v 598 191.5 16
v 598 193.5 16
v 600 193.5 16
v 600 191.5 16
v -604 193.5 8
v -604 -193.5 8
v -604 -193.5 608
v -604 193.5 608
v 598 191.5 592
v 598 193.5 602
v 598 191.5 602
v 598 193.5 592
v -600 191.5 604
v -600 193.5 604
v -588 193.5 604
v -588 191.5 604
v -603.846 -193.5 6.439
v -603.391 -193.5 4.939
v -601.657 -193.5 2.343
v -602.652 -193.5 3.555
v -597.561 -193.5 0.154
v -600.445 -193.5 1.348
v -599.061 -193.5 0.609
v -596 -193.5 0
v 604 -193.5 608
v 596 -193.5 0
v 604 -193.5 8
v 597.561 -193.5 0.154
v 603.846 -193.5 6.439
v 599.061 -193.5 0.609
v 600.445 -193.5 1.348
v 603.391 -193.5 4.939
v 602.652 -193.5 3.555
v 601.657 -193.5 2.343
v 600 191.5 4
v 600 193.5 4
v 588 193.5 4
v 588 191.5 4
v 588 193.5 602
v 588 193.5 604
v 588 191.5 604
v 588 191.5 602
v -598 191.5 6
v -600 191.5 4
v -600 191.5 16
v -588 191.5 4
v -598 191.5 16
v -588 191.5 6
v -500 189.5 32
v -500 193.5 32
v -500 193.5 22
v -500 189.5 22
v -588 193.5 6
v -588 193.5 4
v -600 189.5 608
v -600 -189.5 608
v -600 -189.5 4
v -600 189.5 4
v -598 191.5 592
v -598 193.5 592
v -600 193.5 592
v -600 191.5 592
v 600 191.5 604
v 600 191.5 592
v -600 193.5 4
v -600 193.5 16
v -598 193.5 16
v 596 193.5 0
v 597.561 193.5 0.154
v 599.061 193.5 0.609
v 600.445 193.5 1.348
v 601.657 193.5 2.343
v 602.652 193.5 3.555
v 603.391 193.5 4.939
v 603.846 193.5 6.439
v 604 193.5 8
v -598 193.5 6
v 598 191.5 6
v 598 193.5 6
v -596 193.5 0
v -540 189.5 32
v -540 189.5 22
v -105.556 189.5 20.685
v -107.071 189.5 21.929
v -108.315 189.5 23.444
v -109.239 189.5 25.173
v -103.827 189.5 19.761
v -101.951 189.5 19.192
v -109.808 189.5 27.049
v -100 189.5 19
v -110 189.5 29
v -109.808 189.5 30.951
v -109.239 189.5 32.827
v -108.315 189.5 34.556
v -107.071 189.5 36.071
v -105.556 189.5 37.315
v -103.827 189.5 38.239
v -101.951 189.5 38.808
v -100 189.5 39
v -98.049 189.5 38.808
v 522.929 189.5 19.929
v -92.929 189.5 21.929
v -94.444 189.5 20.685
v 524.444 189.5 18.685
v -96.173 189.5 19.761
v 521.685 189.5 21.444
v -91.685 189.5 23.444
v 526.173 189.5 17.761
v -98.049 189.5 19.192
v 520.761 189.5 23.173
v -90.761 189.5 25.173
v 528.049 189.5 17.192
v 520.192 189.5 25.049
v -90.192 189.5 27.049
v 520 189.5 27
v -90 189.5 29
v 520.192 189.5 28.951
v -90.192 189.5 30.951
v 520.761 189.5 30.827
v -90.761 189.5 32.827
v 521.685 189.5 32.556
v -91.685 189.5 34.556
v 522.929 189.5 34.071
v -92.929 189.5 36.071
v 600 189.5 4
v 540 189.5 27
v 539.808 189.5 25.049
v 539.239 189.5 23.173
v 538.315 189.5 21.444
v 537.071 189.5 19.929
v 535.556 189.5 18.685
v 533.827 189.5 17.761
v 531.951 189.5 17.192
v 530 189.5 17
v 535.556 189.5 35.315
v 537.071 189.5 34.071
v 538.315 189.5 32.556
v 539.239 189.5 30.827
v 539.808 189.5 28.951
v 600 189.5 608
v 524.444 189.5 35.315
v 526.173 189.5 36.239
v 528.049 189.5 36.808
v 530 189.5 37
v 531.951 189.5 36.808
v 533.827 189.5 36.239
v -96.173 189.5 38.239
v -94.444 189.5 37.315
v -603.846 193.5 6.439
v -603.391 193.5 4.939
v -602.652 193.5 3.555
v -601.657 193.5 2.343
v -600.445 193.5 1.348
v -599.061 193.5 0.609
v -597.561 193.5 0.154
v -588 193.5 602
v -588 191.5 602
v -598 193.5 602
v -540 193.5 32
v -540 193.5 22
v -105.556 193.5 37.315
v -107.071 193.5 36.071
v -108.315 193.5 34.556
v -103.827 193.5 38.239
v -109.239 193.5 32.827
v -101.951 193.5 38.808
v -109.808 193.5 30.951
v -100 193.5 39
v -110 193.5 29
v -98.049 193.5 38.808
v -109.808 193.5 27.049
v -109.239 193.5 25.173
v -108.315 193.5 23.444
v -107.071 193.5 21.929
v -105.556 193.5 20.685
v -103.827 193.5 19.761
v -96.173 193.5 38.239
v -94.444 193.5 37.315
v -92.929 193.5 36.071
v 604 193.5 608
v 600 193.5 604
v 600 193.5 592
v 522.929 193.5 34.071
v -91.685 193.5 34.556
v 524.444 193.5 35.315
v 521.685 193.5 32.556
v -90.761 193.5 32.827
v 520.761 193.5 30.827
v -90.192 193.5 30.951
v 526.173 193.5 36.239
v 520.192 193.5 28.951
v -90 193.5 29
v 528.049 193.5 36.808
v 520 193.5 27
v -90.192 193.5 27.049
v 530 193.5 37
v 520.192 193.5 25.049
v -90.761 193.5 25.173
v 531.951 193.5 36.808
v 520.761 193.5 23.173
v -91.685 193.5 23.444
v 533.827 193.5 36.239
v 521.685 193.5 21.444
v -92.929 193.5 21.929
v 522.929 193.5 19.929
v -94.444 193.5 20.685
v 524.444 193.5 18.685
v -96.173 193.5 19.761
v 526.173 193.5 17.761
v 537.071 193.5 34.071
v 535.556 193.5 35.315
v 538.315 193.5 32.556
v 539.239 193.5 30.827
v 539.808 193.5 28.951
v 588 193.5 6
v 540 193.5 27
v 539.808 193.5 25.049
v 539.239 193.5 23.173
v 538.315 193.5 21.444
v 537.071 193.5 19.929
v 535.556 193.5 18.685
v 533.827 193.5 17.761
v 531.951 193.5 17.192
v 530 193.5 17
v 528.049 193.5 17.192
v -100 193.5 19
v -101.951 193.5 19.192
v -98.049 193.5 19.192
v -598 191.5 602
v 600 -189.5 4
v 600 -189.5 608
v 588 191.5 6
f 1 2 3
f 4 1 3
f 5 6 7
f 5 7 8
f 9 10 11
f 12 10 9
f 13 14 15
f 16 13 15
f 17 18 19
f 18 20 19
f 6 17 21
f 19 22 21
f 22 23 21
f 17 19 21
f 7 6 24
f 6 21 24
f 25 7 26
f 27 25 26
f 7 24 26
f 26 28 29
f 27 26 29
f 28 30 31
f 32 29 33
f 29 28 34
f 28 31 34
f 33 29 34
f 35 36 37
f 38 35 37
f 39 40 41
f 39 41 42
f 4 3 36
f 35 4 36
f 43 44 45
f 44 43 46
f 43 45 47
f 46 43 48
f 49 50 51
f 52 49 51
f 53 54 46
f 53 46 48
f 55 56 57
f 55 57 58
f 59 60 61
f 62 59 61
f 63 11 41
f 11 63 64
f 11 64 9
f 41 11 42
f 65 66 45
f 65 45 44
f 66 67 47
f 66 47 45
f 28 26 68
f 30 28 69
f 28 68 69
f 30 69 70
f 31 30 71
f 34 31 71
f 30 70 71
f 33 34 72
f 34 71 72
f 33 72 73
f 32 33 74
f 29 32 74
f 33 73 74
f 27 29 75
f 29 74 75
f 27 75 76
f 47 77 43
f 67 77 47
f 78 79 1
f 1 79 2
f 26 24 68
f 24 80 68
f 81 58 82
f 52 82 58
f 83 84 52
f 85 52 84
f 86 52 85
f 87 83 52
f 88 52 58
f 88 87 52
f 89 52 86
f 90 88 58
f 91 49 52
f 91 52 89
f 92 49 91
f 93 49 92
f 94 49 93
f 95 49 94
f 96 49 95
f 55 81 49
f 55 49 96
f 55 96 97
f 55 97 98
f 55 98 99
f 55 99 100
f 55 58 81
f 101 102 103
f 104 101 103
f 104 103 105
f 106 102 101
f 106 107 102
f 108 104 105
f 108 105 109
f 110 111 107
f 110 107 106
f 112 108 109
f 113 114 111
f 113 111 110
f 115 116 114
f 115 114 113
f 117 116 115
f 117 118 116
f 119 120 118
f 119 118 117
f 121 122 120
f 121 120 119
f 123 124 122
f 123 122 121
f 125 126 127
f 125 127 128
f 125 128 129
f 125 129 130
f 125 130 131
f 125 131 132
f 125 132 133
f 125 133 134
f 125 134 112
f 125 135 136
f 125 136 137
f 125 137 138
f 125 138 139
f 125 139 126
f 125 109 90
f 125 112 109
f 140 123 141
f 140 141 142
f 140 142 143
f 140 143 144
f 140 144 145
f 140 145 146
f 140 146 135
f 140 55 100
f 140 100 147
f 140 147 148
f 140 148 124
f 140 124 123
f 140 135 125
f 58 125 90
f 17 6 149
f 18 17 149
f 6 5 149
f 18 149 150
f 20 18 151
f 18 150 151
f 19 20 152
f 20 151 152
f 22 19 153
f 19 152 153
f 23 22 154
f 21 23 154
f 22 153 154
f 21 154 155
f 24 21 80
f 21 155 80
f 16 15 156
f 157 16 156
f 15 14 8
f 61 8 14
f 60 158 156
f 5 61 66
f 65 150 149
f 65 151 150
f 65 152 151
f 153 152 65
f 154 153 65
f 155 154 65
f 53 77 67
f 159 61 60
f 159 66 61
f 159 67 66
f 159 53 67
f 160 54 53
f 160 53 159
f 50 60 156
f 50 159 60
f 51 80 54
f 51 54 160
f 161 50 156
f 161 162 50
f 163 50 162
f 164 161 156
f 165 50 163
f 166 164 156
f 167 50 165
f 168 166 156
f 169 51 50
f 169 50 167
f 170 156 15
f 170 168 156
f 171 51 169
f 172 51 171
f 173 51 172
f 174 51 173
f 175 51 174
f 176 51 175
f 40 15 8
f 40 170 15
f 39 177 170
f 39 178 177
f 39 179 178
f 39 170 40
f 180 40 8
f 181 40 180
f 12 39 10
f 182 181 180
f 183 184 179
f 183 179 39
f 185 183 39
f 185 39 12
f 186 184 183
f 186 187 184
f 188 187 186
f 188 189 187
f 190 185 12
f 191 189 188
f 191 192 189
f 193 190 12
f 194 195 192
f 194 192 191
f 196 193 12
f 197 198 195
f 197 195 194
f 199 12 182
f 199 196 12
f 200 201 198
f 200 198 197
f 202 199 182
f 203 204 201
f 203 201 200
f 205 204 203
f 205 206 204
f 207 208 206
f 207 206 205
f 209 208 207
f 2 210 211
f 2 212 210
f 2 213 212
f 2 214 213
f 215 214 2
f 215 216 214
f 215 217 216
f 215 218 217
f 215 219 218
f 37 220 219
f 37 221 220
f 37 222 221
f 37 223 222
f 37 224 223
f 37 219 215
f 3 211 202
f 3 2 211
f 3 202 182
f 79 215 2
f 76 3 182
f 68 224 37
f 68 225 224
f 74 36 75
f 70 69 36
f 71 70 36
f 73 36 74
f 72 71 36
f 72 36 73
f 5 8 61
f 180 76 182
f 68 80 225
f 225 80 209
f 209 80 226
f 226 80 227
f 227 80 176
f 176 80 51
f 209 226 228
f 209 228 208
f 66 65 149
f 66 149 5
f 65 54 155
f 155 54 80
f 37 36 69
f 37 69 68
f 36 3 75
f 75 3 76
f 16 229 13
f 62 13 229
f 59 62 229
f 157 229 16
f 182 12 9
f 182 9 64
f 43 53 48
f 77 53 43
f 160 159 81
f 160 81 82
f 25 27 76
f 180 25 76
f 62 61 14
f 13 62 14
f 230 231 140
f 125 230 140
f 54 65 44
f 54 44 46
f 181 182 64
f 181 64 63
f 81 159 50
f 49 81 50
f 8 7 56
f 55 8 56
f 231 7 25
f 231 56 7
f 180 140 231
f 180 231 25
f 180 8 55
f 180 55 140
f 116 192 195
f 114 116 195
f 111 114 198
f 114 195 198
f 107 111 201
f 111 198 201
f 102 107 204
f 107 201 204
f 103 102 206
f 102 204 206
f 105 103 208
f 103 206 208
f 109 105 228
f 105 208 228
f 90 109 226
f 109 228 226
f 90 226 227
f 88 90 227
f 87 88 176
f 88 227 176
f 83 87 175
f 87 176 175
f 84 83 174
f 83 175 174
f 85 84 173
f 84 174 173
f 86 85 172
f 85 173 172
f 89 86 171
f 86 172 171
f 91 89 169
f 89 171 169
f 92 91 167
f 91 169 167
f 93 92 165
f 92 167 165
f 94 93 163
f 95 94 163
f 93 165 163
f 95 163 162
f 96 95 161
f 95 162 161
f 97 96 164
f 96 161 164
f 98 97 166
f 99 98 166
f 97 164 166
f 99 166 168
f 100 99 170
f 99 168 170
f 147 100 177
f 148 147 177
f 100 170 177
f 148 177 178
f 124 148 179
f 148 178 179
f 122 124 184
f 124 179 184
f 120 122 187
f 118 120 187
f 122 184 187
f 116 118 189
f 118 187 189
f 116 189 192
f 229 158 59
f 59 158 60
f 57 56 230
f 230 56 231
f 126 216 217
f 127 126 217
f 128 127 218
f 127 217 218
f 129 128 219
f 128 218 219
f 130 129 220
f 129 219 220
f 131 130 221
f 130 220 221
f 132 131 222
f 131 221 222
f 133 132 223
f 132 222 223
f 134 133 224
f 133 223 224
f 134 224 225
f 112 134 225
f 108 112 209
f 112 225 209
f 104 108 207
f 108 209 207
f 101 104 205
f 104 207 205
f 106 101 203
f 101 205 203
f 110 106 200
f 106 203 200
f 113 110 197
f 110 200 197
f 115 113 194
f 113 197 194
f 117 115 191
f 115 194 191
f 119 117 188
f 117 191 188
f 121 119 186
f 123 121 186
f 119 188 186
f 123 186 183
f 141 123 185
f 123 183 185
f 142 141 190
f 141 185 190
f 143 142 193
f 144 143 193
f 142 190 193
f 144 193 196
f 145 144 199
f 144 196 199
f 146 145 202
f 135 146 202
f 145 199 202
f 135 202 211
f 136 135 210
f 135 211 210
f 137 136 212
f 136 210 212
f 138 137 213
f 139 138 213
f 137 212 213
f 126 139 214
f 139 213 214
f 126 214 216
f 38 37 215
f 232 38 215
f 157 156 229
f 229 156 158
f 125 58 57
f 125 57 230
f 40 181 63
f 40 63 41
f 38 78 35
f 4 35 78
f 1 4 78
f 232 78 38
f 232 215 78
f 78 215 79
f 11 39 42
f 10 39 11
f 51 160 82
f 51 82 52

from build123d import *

# Parameters (mm, degrees)
SKETCH1_W            = 1208
SKETCH1_H            = 387
BOSS_EXTRUDE1_DEPTH  = 608
SKETCH2_W            = 1200
SKETCH2_H            = 379
CUT_EXTRUDE1_DEPTH   = 604
FILLET1_R            = 8
CUT_EXTRUDE2_DEPTH   = 2
MIRROR2_COPY_1_DEPTH = 2
SKETCH5_R            = 10
SKETCH5_W            = 40
SKETCH5_H            = 10
CUT_EXTRUDE4_DEPTH   = 4


with BuildPart() as part:
    # Sketch1 → Boss-Extrude1 (new body)
    with BuildSketch(Plane.XY):
        Rectangle(SKETCH1_W, SKETCH1_H)
    extrude(amount=BOSS_EXTRUDE1_DEPTH)

    # Sketch2 → Cut-Extrude1 (cut)
    with BuildSketch(Plane.XY.offset(608)):
        Rectangle(SKETCH2_W, SKETCH2_H)
    extrude(amount=-CUT_EXTRUDE1_DEPTH, mode=Mode.SUBTRACT)

    # Fillet1
    fillet1_edges = [part.edges().sort_by_distance(p)[0] for p in [
        (-604, 0, 0),
        (604, 0, 0),
    ]]
    fillet(fillet1_edges, radius=FILLET1_R)

    # Sketch4 → Cut-Extrude2 (cut)
    with BuildSketch(Plane(origin=(0, 193.5, 0), x_dir=(1, 0, 0), z_dir=(0, 1, 0))):
        Polygon((-600, -604), (-588, -604), (-588, -602), (-598, -602), (-598, -592), (-600, -592), align=None)
    cut_extrude2 = extrude(amount=-CUT_EXTRUDE2_DEPTH, mode=Mode.SUBTRACT)

    # Mirror1: Cut-Extrude2 across plane
    add(cut_extrude2.mirror(Plane(origin=(0, 0, 0), x_dir=(0, 0, 1), z_dir=(1, 0, 0))), mode=Mode.SUBTRACT)

    # Mirror2: Cut-Extrude2 across plane
    add(cut_extrude2.mirror(Plane.XY.offset(304)), mode=Mode.SUBTRACT)

    # Mirror2 copy 1 sketch → Mirror2 copy 1 (cut)
    with BuildSketch(Plane(origin=(0, 193.5, 608), x_dir=(-1, 0, 0), z_dir=(0, 1, 0))):
        Polygon((-600, -604), (-588, -604), (-588, -602), (-598, -602), (-598, -592), (-600, -592), align=None)
    extrude(amount=-MIRROR2_COPY_1_DEPTH, mode=Mode.SUBTRACT)

    # Sketch5 → Cut-Extrude4 (cut)
    with BuildSketch(Plane(origin=(0, 193.5, 0), x_dir=(1, 0, 0), z_dir=(0, 1, 0))):
        with Locations((-100, -29)):
            Circle(SKETCH5_R)
        with Locations((530, -27)):
            Circle(SKETCH5_R)
        with Locations((-520, -27)):
            Rectangle(SKETCH5_W, SKETCH5_H)
    extrude(amount=-CUT_EXTRUDE4_DEPTH, mode=Mode.SUBTRACT)


solid = part.part
